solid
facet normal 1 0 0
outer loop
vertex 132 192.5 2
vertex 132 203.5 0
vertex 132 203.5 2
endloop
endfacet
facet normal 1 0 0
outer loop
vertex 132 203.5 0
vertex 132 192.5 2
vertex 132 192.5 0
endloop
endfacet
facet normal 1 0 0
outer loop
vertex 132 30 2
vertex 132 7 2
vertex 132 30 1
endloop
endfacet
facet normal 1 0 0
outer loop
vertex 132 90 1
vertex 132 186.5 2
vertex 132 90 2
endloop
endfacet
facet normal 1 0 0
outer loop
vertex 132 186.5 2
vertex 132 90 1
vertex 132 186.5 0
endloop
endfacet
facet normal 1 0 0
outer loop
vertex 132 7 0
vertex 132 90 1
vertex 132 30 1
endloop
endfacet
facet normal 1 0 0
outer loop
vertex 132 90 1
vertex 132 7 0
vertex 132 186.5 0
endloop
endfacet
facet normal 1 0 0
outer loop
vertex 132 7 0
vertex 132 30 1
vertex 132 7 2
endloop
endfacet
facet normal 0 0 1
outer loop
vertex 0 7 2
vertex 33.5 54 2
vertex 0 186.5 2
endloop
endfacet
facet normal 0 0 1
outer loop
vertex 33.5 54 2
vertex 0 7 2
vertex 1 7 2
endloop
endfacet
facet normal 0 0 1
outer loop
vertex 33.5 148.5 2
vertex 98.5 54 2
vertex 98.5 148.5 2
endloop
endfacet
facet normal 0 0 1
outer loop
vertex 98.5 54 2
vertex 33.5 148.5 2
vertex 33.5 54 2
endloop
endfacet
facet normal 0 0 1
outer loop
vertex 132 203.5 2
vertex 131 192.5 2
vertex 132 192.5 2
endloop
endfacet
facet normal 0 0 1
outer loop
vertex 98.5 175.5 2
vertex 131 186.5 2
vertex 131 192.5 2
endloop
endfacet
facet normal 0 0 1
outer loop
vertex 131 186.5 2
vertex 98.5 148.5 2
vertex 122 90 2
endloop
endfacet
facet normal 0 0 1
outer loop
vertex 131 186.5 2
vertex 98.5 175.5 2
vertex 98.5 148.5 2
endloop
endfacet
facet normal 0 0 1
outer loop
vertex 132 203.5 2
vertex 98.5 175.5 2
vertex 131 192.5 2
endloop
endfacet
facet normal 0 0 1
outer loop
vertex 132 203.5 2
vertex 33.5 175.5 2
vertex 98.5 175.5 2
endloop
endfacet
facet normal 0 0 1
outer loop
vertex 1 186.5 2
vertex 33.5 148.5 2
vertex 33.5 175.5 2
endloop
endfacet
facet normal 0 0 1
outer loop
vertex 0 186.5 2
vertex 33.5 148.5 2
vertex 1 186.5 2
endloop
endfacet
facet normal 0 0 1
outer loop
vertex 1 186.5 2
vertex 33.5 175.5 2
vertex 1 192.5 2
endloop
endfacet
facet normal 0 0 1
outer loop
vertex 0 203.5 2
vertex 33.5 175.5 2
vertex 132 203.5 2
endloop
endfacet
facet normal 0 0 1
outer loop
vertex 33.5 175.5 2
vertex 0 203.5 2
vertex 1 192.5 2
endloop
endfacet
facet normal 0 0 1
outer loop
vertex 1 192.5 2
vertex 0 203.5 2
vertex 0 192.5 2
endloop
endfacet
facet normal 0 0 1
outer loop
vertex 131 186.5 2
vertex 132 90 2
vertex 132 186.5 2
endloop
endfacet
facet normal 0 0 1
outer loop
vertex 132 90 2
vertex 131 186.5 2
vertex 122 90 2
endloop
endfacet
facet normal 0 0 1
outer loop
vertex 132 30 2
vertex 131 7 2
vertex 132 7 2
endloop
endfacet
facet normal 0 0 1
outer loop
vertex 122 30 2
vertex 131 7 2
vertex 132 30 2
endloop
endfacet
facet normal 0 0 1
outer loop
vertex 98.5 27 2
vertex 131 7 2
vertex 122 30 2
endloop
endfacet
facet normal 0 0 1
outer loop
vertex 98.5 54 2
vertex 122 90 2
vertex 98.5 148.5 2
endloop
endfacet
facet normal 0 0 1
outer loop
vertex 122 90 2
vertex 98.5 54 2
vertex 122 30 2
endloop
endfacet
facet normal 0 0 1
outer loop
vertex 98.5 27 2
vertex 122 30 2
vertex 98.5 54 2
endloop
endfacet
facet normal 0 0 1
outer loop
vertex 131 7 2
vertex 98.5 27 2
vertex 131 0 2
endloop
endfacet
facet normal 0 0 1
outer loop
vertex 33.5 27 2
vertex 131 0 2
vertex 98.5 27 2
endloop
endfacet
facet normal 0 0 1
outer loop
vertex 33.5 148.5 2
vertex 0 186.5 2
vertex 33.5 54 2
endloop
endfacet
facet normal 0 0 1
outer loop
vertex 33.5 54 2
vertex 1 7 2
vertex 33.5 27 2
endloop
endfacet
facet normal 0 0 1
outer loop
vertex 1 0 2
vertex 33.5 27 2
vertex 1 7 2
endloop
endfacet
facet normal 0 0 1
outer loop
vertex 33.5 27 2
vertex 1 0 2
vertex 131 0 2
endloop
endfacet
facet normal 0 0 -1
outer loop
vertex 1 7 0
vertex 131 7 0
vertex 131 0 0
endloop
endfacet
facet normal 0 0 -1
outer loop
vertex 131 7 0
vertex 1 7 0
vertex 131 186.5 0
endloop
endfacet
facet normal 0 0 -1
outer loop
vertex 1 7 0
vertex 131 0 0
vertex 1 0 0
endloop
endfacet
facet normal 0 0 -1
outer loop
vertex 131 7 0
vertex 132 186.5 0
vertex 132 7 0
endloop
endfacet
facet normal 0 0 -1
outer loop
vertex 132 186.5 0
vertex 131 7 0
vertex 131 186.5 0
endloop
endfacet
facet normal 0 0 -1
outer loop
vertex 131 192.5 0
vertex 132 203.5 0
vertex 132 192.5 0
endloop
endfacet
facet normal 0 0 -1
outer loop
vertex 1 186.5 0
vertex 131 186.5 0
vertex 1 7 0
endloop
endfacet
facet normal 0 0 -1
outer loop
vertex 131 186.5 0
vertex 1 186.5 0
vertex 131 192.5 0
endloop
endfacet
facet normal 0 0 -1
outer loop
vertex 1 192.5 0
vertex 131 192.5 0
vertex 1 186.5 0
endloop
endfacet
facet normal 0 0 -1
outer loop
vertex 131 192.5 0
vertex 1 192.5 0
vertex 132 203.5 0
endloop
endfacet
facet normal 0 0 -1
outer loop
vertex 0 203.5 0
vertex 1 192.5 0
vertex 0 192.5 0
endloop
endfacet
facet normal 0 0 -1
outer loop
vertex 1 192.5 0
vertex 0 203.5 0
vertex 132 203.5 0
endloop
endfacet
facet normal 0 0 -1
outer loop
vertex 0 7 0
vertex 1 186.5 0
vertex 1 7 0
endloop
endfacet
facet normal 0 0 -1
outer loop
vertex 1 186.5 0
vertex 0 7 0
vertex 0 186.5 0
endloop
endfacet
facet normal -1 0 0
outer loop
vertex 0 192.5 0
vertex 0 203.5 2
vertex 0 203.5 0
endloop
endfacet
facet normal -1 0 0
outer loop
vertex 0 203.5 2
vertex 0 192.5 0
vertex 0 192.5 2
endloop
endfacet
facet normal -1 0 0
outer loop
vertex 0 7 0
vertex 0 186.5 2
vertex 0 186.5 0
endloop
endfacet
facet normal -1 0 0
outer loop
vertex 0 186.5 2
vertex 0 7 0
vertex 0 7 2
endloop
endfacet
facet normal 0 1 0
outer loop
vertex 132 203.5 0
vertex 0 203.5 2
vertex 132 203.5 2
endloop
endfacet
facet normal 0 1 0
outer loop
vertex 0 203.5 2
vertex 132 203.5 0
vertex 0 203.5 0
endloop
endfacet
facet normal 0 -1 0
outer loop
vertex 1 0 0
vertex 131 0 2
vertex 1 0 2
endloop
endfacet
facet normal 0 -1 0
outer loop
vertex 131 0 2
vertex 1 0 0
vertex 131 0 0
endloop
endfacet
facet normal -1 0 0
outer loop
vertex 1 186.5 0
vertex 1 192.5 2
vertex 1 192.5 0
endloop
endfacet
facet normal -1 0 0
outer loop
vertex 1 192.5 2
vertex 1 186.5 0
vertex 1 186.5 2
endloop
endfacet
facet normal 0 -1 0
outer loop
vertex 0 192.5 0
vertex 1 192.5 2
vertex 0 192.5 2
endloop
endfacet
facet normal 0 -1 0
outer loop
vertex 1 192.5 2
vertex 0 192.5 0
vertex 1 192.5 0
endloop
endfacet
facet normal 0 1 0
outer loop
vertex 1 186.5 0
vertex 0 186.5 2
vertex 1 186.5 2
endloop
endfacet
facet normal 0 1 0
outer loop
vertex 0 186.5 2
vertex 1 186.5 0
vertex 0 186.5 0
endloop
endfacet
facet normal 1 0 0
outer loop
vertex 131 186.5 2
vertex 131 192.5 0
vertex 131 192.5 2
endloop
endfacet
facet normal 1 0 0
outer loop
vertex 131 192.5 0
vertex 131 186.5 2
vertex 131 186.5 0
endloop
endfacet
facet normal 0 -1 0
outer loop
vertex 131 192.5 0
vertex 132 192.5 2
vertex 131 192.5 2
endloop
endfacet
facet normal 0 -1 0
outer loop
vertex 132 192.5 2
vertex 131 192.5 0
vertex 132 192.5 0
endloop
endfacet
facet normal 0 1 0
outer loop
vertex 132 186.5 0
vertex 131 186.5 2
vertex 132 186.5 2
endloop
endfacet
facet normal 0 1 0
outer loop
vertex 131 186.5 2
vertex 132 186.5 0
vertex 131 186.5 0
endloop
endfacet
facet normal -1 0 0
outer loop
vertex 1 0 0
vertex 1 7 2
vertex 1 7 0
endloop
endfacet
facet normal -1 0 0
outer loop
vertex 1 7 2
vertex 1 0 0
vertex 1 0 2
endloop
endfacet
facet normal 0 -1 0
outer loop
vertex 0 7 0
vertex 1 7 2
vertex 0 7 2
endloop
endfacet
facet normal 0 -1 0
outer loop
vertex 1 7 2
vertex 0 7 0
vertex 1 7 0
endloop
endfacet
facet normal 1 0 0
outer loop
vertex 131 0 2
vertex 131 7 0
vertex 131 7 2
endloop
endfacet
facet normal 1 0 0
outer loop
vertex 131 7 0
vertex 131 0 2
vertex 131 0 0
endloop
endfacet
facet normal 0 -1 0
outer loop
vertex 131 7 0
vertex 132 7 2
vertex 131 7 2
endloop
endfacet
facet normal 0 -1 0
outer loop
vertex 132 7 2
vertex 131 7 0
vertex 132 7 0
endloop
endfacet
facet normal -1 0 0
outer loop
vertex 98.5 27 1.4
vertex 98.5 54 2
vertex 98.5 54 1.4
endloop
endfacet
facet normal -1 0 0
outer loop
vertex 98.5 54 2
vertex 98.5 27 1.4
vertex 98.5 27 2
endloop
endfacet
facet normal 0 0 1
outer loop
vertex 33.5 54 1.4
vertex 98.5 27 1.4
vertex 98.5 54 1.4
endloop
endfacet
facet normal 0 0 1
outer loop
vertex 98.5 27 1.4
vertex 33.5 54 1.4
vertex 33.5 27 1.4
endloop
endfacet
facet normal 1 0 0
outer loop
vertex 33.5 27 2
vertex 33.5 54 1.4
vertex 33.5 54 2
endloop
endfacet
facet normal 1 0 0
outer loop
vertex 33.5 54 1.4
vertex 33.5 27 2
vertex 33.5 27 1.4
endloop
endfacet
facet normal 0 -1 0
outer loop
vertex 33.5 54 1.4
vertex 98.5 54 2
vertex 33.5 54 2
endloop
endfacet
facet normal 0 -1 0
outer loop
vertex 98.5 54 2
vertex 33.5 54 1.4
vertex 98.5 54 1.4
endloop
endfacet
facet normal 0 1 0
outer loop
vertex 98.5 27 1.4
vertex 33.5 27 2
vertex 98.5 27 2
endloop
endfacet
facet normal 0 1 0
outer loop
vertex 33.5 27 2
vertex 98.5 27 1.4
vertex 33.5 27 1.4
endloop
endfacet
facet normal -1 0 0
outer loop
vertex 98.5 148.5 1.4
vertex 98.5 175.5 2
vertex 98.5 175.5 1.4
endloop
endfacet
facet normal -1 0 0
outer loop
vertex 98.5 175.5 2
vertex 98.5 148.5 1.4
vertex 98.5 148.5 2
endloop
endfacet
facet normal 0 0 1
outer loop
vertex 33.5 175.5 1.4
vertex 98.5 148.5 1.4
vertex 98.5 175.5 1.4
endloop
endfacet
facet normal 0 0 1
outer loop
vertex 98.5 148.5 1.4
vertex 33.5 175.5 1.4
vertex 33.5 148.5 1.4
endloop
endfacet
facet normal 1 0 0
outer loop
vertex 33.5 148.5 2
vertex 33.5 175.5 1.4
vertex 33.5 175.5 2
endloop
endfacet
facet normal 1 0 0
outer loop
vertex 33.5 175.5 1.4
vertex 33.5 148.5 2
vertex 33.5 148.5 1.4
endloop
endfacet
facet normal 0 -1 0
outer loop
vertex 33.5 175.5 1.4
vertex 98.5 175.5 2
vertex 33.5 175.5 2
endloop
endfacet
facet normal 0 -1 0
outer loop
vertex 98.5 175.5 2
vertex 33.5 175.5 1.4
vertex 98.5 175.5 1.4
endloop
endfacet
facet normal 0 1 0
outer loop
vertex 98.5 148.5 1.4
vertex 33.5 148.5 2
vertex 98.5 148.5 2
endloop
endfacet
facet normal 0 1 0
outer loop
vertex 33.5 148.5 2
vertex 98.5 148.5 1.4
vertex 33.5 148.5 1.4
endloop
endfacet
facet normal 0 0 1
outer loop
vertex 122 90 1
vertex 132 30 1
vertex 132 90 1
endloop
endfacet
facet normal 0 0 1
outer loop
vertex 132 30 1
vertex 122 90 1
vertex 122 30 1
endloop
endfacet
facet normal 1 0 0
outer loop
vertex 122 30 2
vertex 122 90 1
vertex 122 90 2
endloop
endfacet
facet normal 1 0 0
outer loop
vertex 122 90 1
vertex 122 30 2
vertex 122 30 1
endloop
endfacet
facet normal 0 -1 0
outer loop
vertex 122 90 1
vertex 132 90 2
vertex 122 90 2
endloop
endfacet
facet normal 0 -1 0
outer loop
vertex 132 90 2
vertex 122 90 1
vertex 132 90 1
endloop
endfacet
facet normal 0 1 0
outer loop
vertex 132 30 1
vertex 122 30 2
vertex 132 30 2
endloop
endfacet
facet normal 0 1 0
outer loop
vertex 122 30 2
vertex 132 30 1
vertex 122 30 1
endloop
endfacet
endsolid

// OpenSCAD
/*  
**  Name:  Writing Pad Holder_3d_model
**  Author:  Chris Benson  @TheExtruder
**  Created:  2/24/2017
*/

part = "Base" ; // [Base,Pen Cup,Top Pad Holder,Bottom Pad Holder,All]

/*[Base Dimensions]*/
baseWidth = 127;
baseHeight = 203.5;
baseDepth = 2;

/*[Pad Holders]*/
padHolderThickness = 1;
topPadHolderHeight = 6;
bottomPadHolderHeight = 7;

/*[Pen Cup]*/
penCupInnerDiameter = 12;
penCupOuterDiameter = 14;
penCupHeight = 60;
penCupAttachmentThickness = 1;
penCupBaseAttachmentLength = 20;
penCupBaseOverlap = 10;

/*[Sticker Slots]*/
stickerSlotWidth = 65;
stickerSlotHeight = 27;
stickerSlotDepth = .6;

/*[Buffers]*/
topBuffer = 17; //distance from the top to the start of the top of the pad holder
bottomBuffer = 5; //distance from the bottom to thetop of the lower pad holder
sideBuffer = 5; //distance to leave extra beyond the pad dimensions
basePadHolderBuffer = 2; //distance between the base and the pad holders

$fn = 100;

print_part();

module print_part() {
	if (part == "Base") {
        Base();
	} else if (part == "Pen Cup") {
        PenCup();
	} else if (part == "Top Pad Holder") {
		TopPadHolder();
    } else if (part == "Bottom Pad Holder") {
		BottomPadHolder();
    } else if (part == "All") {
		Base();
        
        translate([-penCupOuterDiameter, baseWidth+sideBuffer+penCupOuterDiameter+5, 0])
            PenCup();
        
        rotate([0,0,90])
            translate([0, 5, 0])
                TopPadHolder();
        
        rotate([0,0,90])
            translate([0, bottomPadHolderHeight+10, 0])
                BottomPadHolder();
    }
}

//base
module Base(){
    difference(){
        cube([baseWidth+sideBuffer, baseHeight, baseDepth], false);
        color("red")
        //    translate([(baseWidth + sideBuffer)/2,baseHeight/2,baseDepth/(baseDepth*2)])
        //        linear_extrude(height = baseDepth)
        //            text("Back", valign="bottom", halign="center");
        //logo
        translate([-3,200,1.25])
            scale([.5,.5])
               linear_extrude(height = 1)
                    import(file = "TheExtruder_3d_model_text_base.dxf", layer = "Main");//, origin=[0,-350]
        
        translate([0,baseHeight-topBuffer,0])
            cube([padHolderThickness, topPadHolderHeight, baseDepth], false);
        
        translate([baseWidth+sideBuffer-padHolderThickness,baseHeight-topBuffer,0])
            cube([padHolderThickness, topPadHolderHeight, baseDepth], false);
    
        cube([padHolderThickness, bottomPadHolderHeight, baseDepth], false);
        translate([baseWidth+sideBuffer-padHolderThickness,0,0])
            cube([padHolderThickness, bottomPadHolderHeight, baseDepth], false);
    
        translate([(baseWidth+sideBuffer)/2,stickerSlotHeight*1.5,baseDepth-(stickerSlotDepth/2)])
            cube([stickerSlotWidth, stickerSlotHeight, stickerSlotDepth], true);
        
        translate([(baseWidth+sideBuffer)/2,stickerSlotHeight*6,baseDepth-(stickerSlotDepth/2)])
            cube([stickerSlotWidth, stickerSlotHeight, stickerSlotDepth], true);

        translate([baseWidth+sideBuffer-(penCupBaseOverlap/2),penCupHeight,baseDepth-(penCupAttachmentThickness/2)])
            cube([penCupBaseOverlap, penCupHeight, penCupAttachmentThickness], true);
    }
}


//pen cup
module PenCup(){
    union(){
        rotate([0,0,90]) //rotate so that the All option doesn't collide
            translate([0,(penCupInnerDiameter/2),0])
                cube([penCupBaseAttachmentLength,penCupAttachmentThickness,penCupHeight]);
        cylinder(2, d = penCupOuterDiameter, true);
        difference(){
            cylinder(penCupHeight, d = penCupOuterDiameter, true);
            cylinder(penCupHeight, d = penCupInnerDiameter, true);
        }
        
        translate([-(penCupOuterDiameter/2),(penCupInnerDiameter/2),0])
        cube([penCupOuterDiameter/2,penCupAttachmentThickness,penCupHeight]);
    }
}

//Bottom Pad Holder
module BottomPadHolder(){
    union(){
        cube([baseWidth+sideBuffer, padHolderThickness, baseDepth+basePadHolderBuffer], false);
        cube([baseWidth+sideBuffer, bottomPadHolderHeight+padHolderThickness, padHolderThickness], false);
        cube([padHolderThickness, bottomPadHolderHeight+padHolderThickness, baseDepth+basePadHolderBuffer], false);
        
        translate([baseWidth + sideBuffer - padHolderThickness,0,0])
            cube([padHolderThickness, bottomPadHolderHeight+padHolderThickness, baseDepth+basePadHolderBuffer], false);
    }
}

//Top Pad Holder
module TopPadHolder(){
    union(){
        cube([baseWidth+sideBuffer, topPadHolderHeight, padHolderThickness], false);
        
        cube([padHolderThickness, topPadHolderHeight, baseDepth+basePadHolderBuffer], false);
        translate([baseWidth + sideBuffer - padHolderThickness,0,0])
            cube([padHolderThickness, topPadHolderHeight, baseDepth+basePadHolderBuffer], false);
    }
}
